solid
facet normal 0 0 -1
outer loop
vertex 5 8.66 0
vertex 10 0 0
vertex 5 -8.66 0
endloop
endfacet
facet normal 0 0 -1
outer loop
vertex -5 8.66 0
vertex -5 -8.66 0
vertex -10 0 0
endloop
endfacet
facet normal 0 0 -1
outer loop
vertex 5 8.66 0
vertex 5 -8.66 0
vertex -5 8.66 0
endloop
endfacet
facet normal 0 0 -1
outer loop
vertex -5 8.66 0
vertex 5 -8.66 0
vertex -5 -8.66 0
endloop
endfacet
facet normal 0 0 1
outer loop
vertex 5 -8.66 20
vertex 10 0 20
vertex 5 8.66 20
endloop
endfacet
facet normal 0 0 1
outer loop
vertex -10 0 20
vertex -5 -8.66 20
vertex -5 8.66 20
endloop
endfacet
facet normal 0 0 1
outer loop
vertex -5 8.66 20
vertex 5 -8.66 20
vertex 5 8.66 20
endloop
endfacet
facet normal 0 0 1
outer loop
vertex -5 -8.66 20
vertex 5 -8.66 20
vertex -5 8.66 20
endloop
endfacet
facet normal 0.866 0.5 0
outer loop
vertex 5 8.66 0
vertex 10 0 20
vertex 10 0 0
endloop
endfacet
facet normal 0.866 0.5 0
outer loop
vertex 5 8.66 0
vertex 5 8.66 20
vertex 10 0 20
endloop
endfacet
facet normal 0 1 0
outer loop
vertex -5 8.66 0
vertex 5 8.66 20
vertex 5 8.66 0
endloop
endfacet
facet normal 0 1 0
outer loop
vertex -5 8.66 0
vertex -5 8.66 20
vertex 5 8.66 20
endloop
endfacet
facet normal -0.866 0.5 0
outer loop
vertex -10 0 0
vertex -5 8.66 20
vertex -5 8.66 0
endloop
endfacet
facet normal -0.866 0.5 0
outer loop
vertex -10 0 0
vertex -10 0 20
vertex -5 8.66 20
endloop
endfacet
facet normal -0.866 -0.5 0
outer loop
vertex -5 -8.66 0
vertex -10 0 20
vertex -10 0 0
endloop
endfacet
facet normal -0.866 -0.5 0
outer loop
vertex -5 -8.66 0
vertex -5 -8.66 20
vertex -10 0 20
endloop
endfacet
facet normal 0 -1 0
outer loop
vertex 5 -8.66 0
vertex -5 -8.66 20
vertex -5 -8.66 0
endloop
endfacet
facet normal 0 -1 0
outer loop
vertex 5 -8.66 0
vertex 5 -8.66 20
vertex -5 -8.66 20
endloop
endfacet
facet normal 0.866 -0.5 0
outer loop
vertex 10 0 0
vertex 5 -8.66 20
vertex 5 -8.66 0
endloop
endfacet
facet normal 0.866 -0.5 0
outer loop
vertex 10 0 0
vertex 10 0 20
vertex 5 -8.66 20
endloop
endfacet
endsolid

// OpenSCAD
// The guard against over-merging: six genuine 60-degree edges. Any smoothing
// rule that reaches these has gone too far.
linear_extrude(height = 20) circle(r = 10, $fn = 6);
